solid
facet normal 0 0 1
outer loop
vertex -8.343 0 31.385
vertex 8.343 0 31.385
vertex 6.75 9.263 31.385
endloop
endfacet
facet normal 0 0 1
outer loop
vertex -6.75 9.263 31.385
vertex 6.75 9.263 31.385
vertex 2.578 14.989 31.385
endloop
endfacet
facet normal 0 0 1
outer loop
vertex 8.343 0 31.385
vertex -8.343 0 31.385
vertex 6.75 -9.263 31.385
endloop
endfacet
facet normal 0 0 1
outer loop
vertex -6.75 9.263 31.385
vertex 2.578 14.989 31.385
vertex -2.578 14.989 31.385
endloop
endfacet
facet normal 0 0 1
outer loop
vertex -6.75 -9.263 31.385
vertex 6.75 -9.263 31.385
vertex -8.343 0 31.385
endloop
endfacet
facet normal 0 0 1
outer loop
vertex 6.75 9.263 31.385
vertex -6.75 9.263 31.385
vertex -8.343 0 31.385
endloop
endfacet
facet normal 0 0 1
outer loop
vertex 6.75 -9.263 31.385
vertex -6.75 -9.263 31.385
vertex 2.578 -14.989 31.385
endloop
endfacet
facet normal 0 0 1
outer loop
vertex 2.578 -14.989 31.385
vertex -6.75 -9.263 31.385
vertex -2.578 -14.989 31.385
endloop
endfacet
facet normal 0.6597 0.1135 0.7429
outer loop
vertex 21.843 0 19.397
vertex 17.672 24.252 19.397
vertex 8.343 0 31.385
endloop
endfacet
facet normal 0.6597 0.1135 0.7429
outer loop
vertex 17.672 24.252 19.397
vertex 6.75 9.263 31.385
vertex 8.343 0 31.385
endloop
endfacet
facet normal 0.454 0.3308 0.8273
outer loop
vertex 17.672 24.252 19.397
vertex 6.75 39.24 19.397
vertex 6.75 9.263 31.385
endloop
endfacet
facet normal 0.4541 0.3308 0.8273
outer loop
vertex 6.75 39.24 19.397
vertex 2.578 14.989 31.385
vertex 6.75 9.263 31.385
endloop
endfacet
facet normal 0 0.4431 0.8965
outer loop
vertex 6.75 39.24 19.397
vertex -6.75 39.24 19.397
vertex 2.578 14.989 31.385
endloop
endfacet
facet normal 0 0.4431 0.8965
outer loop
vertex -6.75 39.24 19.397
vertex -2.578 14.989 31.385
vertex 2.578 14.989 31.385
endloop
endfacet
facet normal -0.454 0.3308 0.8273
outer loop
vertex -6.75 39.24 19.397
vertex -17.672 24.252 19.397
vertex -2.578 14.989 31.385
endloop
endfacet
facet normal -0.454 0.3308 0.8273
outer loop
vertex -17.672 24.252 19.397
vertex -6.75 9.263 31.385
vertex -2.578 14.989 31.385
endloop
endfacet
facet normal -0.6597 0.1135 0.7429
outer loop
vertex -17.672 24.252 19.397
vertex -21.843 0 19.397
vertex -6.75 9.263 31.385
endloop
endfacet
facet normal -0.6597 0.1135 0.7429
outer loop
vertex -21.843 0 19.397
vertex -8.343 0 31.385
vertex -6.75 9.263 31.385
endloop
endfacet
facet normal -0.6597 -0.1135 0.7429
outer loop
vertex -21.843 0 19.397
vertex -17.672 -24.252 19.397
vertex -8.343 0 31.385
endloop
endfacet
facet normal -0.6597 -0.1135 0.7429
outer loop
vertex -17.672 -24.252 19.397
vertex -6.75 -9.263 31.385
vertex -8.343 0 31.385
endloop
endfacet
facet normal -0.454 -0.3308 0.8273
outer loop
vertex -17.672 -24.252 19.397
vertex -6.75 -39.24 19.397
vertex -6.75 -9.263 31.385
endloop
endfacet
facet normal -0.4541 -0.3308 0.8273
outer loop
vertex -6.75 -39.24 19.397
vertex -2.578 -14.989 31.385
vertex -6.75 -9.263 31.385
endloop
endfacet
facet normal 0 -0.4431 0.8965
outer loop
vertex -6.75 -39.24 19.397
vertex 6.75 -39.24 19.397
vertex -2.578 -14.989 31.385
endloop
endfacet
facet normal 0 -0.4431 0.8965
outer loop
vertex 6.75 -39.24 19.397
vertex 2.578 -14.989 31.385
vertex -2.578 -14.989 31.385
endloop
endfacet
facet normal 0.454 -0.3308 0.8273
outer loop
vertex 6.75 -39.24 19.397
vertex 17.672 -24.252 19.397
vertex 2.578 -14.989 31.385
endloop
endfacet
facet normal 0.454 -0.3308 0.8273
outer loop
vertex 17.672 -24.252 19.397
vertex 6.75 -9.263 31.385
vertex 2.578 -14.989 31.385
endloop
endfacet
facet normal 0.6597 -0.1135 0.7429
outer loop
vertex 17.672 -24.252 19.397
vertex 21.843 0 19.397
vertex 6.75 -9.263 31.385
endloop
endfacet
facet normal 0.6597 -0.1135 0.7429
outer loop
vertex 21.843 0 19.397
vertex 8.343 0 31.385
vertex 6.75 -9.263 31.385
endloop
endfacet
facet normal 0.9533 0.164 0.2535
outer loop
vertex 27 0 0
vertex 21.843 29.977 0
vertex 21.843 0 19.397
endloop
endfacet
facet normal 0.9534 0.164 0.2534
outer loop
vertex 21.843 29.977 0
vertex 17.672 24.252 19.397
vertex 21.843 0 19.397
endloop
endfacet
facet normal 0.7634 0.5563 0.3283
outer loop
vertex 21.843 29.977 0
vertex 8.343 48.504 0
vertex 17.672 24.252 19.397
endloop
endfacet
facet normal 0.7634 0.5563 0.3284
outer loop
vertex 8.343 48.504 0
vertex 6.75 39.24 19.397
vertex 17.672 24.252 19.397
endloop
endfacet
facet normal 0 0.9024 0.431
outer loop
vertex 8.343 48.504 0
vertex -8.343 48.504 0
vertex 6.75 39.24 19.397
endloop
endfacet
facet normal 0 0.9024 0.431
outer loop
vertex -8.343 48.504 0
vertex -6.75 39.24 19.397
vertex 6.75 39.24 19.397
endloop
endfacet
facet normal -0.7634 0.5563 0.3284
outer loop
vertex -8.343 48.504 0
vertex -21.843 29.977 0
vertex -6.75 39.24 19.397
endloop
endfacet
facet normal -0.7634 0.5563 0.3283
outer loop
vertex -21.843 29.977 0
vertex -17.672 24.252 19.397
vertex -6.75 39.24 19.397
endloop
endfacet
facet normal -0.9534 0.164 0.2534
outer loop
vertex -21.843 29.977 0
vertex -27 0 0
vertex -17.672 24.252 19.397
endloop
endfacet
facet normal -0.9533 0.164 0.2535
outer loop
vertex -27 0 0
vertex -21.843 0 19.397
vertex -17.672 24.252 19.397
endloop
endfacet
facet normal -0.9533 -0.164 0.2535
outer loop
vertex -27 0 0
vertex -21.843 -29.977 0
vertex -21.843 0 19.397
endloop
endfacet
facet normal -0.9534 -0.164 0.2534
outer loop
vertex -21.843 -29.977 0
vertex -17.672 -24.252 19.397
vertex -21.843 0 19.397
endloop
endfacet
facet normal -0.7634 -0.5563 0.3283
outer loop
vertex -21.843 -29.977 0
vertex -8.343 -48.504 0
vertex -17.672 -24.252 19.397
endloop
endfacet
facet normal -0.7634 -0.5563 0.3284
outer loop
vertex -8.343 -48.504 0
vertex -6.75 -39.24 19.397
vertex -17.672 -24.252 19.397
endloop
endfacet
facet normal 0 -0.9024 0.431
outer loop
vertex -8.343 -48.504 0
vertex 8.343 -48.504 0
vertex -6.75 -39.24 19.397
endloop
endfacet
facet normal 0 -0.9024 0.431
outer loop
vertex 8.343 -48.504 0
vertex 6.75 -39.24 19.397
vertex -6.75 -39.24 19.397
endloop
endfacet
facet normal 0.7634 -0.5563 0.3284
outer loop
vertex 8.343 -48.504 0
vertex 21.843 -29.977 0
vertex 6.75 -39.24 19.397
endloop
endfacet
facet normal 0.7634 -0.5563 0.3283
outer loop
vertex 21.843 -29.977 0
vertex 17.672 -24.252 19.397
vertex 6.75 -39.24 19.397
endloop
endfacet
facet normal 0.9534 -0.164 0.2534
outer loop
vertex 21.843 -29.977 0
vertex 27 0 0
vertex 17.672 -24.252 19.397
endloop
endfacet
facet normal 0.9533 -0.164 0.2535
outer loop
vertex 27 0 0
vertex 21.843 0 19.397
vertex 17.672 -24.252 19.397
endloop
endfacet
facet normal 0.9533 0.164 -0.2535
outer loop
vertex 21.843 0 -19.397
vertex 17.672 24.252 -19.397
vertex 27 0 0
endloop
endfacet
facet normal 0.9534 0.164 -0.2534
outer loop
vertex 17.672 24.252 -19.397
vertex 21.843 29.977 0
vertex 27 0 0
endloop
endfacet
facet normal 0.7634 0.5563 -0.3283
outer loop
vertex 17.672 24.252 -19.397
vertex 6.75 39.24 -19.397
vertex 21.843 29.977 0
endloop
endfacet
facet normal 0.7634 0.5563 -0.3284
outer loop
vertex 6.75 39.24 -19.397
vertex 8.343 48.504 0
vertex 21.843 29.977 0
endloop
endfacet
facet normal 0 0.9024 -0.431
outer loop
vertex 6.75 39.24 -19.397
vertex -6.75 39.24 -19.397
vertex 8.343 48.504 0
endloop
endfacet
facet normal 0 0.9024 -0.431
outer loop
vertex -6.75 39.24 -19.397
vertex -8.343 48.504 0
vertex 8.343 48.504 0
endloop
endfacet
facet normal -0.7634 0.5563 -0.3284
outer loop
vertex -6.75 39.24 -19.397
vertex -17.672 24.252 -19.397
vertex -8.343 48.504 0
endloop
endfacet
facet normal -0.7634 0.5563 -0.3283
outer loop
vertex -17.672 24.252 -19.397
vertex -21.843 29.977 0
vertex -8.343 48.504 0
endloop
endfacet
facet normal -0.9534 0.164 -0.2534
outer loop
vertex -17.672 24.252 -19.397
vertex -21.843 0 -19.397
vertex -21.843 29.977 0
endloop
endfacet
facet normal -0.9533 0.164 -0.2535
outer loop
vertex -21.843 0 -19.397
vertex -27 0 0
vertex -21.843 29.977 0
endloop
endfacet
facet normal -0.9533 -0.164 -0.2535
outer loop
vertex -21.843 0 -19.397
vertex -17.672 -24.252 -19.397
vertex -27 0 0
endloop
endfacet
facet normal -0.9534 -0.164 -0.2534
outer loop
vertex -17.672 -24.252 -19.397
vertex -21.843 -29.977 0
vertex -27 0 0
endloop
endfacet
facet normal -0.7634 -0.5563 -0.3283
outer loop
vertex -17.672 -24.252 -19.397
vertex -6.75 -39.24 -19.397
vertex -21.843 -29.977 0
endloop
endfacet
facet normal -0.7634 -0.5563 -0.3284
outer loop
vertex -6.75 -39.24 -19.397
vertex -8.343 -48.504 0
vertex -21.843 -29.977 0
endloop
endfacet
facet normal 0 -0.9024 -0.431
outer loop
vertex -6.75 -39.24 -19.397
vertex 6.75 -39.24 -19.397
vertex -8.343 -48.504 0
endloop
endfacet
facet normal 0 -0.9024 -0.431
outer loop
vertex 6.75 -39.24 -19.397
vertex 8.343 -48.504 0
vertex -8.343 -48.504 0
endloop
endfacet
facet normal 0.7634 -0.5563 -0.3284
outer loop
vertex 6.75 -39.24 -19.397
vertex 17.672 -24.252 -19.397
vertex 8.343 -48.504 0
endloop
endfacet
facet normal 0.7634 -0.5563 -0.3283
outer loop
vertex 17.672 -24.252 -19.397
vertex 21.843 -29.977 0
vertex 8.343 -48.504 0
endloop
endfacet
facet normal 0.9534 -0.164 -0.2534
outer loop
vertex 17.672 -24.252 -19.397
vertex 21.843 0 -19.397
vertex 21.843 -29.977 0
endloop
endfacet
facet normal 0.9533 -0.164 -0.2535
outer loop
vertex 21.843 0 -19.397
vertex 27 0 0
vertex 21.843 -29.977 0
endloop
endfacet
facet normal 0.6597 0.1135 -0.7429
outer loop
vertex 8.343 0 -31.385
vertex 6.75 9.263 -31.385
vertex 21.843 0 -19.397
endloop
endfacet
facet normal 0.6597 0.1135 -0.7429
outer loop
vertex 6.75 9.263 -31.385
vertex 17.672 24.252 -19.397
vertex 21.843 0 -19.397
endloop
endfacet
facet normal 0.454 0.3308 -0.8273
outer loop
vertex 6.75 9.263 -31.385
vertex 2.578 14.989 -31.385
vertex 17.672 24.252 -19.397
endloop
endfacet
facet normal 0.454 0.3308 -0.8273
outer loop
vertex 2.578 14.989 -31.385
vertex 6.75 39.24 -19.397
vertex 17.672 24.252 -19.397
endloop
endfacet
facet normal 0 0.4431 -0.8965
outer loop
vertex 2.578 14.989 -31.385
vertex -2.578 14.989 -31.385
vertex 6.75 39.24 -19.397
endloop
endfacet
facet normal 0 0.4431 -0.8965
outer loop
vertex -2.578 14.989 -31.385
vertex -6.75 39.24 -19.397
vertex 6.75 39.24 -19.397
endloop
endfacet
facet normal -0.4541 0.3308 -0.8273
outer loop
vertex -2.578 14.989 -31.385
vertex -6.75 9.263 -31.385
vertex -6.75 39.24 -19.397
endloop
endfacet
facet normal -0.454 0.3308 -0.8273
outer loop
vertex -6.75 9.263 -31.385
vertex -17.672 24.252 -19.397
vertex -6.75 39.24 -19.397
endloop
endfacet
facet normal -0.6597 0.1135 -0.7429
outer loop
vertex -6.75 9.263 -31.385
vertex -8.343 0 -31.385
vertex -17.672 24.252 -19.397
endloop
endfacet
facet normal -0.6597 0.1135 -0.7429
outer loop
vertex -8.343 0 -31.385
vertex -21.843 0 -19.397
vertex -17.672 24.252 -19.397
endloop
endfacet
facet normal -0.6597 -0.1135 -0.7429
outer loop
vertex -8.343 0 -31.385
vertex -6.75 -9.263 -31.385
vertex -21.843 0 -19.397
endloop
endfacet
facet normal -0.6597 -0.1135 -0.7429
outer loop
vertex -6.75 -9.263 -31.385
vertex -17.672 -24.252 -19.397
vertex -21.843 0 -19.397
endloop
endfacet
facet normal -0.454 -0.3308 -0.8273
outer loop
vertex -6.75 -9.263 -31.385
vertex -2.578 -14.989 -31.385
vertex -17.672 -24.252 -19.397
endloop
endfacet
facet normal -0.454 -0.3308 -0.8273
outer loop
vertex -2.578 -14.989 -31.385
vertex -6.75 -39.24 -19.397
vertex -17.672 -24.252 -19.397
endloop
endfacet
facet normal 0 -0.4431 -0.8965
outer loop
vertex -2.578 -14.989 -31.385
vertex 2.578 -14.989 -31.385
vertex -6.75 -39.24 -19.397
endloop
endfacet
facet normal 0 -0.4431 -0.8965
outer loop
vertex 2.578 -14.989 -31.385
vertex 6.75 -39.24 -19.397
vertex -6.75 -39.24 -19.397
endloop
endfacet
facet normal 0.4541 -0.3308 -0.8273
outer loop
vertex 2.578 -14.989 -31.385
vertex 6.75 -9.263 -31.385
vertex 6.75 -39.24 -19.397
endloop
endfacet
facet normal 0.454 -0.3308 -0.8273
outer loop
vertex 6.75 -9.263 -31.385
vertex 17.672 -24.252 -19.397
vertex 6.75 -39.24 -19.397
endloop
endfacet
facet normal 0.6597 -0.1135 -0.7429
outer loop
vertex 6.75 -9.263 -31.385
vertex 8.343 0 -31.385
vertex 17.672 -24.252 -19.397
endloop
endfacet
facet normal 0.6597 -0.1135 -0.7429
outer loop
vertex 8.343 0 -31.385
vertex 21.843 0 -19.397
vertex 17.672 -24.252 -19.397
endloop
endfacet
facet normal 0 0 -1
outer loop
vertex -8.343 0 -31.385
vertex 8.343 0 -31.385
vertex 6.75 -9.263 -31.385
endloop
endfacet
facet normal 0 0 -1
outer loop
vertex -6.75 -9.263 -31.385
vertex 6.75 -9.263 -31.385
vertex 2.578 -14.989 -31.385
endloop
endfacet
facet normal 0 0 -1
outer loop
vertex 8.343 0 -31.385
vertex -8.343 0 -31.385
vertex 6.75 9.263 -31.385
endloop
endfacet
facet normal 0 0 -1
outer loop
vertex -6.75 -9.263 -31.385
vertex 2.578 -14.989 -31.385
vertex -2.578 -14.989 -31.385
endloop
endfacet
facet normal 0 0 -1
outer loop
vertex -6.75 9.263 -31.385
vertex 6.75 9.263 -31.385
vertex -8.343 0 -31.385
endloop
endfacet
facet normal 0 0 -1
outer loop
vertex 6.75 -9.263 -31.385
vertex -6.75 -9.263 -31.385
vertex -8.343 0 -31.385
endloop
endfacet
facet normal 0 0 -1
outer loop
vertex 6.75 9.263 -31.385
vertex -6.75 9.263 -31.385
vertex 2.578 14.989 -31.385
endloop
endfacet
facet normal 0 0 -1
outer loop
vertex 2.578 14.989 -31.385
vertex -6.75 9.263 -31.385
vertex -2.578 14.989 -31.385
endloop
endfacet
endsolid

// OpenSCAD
// Generated by SolidPython 1.0.1 on 2020-07-29 00:46:49


scale(v = [9, 17, 11]) {
	sphere(r = 3);
}
/***********************************************
*********      SolidPython code:      **********
************************************************
 
# import packages: SolidPython
from solid import *
from solid.utils import *
from itertools import chain, combinations, permutations


class Resize:

    def __init__(self, scad_file):
        self.scad_file = scad_file
        #self.scad_file = import_scad(scad_file)
        # cone/cylinder param:
        self.r1 = 0
        self.r2 = 0
        self.h = 0
        # rectangular prism param:
        self.w = 0
        self.l = 0
        # ellipse param:
        self.r = 0

    # import OpenScad code (file name corresponds to shape)


    # classify shape + parameters
    def assign(self, param1, param2, param3):
        if self.scad_file == 'cone.scad':
            self.r1 = param1
            self.r2 = param2
            self.h = param3
        elif self.scad_file == 'cylinder.scad':
            self.r1 = param1
            self.r2 = param2
            self.h = param3
        elif self.scad_file == 'rectangularPrism.scad':
            self.h = param1
            self.l = param2
            self.w = param3
        else:
            self.r = param1
            self.h = param2

    # resize parameters
    def iterate(self):
        x = range(3, 20, 2)
        i = 1
        if self.scad_file == 'cone.scad':
            tempList = list(permutations(x, 2))
            for temp in tempList:
                param1 = temp[0]
                param2 = temp[1]
                filepath = 'produced_scad_files/' + 'cone' + str(param1) + '_' + str(param2) + '_' + '.scad'
                scad_render_to_file(cylinder(h=param1, r1=param2, r2=0), filepath)

        elif self.scad_file == 'cylinder.scad':
            tempList = list(permutations(x, 3))
            for temp in tempList:
                param1 = temp[0]
                param2 = temp[1]
                filepath = 'produced_scad_files/' + 'cylinder' + str(param1) + '_' + str(param2) + '_' + '.scad'
                scad_render_to_file(cylinder(h=param1, r1=param2, r2=param2), filepath)

        elif self.scad_file == 'rectangularPrism.scad':
            tempList = list(permutations(x, 3))
            for temp in tempList:
                param1 = temp[0]
                param2 = temp[1]
                param3 = temp[2]
                filepath = 'produced_scad_files/' + 'rectangularPrism' + str(param1) + '_' + str(param2) + '_' + str(
                    param3) + '.scad'
                scad_render_to_file(cube(size=(param1, param2, param3)), filepath)

        elif self.scad_file == 'ellipse.scad':
            tempList = list(permutations(x, 4))
            for temp in tempList:
                param1 = temp[0]
                param2 = temp[1]
                param3 = temp[2]
                param4 = temp[3]
                filepath = 'produced_scad_files/' + 'ellipse' + str(param1) + '_' + str(param2) + '_' + str(param3) + '_' + str(param4) + '.scad'
                scad_render_to_file(scale([param1, param2, param3])(sphere(r=param4)), filepath)

    def render_to_scadfile(self):
        scad_render_to_file(scad, 'example.scad') 
 
************************************************/
